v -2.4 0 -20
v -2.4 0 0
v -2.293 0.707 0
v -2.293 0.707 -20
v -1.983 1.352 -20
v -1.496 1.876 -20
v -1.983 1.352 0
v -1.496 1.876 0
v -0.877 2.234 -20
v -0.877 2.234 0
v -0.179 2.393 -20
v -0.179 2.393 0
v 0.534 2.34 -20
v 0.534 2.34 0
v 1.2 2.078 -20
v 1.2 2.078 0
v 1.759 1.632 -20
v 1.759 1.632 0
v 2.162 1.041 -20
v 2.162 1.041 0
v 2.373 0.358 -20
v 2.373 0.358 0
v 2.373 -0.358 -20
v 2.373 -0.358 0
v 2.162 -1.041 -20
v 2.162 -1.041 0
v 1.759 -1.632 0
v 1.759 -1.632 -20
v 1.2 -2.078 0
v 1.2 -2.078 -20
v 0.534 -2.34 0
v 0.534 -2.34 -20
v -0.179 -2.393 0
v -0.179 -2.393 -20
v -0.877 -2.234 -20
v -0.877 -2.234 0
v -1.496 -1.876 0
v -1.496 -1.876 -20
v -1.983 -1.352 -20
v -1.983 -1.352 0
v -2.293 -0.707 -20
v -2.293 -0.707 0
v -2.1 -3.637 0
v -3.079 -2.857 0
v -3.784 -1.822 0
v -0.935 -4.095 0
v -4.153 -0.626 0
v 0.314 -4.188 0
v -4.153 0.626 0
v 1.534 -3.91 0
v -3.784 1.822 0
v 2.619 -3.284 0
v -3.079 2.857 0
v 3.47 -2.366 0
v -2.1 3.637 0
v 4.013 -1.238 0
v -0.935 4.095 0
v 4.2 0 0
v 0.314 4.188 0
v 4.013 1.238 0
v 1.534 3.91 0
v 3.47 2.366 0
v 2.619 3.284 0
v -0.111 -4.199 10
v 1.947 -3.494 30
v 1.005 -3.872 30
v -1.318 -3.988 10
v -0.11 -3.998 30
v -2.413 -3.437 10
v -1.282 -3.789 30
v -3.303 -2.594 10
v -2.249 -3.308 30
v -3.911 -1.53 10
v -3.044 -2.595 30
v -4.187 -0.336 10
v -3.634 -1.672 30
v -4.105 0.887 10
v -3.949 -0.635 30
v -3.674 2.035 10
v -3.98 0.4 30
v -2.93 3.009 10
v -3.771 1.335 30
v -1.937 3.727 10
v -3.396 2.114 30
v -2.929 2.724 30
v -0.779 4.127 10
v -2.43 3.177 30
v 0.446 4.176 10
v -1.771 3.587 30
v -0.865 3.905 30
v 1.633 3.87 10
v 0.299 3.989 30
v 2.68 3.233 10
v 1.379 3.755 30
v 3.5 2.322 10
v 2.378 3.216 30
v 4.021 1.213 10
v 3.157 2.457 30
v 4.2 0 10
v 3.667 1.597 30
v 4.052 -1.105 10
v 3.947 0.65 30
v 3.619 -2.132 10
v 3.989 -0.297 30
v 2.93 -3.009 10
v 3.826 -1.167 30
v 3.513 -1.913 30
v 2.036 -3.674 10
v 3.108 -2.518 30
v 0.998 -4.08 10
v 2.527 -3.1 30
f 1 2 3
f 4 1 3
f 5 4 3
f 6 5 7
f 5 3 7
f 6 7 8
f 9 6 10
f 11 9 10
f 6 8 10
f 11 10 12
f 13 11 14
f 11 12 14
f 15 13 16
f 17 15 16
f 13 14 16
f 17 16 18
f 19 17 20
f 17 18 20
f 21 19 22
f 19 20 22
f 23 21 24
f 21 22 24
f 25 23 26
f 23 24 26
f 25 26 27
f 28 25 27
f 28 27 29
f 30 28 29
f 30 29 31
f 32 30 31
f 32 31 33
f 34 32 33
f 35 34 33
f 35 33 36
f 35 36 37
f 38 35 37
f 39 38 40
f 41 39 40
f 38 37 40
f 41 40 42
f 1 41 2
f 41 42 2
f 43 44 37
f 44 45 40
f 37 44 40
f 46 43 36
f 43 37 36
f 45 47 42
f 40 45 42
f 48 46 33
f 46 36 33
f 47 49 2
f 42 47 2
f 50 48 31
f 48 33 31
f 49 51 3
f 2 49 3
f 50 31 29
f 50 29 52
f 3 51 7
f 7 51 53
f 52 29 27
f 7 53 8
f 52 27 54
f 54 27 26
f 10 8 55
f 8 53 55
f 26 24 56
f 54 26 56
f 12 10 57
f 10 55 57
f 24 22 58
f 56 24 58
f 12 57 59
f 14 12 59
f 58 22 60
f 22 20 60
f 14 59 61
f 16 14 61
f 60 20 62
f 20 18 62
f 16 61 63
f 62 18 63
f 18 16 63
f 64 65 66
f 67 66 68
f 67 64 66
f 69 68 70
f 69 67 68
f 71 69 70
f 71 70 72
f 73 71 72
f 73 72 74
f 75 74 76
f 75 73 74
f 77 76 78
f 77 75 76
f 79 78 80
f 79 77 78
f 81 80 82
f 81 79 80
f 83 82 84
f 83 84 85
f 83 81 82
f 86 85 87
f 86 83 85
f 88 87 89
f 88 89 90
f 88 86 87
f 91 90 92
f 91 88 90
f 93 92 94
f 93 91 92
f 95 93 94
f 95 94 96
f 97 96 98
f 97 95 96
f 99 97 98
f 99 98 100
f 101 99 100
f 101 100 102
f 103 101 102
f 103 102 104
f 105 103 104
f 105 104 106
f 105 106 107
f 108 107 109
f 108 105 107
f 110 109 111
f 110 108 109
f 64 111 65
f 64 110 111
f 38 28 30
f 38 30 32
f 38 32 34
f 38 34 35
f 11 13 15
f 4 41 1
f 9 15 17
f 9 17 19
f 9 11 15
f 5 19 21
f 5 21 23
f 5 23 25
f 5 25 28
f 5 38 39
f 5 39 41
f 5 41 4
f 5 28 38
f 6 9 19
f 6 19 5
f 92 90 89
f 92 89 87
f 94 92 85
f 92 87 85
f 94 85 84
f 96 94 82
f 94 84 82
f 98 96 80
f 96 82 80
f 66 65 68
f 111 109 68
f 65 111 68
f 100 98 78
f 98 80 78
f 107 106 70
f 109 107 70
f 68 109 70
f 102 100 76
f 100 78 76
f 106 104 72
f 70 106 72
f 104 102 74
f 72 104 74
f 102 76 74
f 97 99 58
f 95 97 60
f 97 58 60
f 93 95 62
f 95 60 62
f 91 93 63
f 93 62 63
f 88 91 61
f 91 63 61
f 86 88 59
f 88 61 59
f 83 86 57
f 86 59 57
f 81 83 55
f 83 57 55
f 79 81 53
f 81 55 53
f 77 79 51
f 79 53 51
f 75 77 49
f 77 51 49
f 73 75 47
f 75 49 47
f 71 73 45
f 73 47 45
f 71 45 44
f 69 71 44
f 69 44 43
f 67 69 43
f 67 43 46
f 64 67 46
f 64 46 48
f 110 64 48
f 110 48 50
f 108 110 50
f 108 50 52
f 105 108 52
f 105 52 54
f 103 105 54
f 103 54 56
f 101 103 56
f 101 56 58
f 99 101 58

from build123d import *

# Parameters (mm, degrees)
ESBO_O1_R                = 4.2
RESSALTO_EXTRUS_O1_DEPTH = 10
ESBO_O3_R                = 2.4
RESSALTO_EXTRUS_O2_DEPTH = 20


with BuildPart() as part:
    # Esboço1 → Ressalto-extrusão1 (new body)
    with BuildSketch(Plane.XY):
        Circle(ESBO_O1_R)
    extrude(amount=RESSALTO_EXTRUS_O1_DEPTH)

    # Loft1: read off the stored shape, not the designer's step
    # Loft1: loft between two sections, ruled curve by curve
    loft1_from = [
        Edge.make_bspline([(1.94680537, -3.494273723, 30), (-5.041742075, -7.387884464, 30), (-8.935352816, -0.399337018, 30), (-1.94680537, 3.494273723, 30), (5.041742075, 7.387884464, 30), (8.935352816, 0.399337018, 30), (1.94680537, -3.494273723, 30)], [0, 0, 0, 0, 0.5, 0.5, 0.5, 1, 1, 1, 1], 3, [1, 0.333333333, 0.333333333, 1, 0.333333333, 0.333333333, 1]),
    ]
    loft1_to = [
        Edge.make_bspline([(-0.110822525, -4.198537646, 10), (-8.507897818, -3.976892596, 10), (-8.286252768, 4.420182696, 10), (0.110822525, 4.198537646, 10), (8.507897818, 3.976892596, 10), (8.286252768, -4.420182696, 10), (-0.110822525, -4.198537646, 10)], [0, 0, 0, 0, 0.5, 0.5, 0.5, 1, 1, 1, 1], 3, [1, 0.333333333, 0.333333333, 1, 0.333333333, 0.333333333, 1]),
    ]
    loft1 = Solid(Shell([*[Face.make_surface_from_curves(loft1_from[k], loft1_to[k]) for k in range(1)], Face(Wire(loft1_from)), Face(Wire(loft1_to))]))
    add(loft1)

    # Esboço3 → Ressalto-extrusão2 (add)
    with BuildSketch(Plane(origin=(0, 0, 0), x_dir=(-1, 0, 0), z_dir=(0, 0, -1))):
        Circle(ESBO_O3_R)
    extrude(amount=RESSALTO_EXTRUS_O2_DEPTH)


solid = part.part
